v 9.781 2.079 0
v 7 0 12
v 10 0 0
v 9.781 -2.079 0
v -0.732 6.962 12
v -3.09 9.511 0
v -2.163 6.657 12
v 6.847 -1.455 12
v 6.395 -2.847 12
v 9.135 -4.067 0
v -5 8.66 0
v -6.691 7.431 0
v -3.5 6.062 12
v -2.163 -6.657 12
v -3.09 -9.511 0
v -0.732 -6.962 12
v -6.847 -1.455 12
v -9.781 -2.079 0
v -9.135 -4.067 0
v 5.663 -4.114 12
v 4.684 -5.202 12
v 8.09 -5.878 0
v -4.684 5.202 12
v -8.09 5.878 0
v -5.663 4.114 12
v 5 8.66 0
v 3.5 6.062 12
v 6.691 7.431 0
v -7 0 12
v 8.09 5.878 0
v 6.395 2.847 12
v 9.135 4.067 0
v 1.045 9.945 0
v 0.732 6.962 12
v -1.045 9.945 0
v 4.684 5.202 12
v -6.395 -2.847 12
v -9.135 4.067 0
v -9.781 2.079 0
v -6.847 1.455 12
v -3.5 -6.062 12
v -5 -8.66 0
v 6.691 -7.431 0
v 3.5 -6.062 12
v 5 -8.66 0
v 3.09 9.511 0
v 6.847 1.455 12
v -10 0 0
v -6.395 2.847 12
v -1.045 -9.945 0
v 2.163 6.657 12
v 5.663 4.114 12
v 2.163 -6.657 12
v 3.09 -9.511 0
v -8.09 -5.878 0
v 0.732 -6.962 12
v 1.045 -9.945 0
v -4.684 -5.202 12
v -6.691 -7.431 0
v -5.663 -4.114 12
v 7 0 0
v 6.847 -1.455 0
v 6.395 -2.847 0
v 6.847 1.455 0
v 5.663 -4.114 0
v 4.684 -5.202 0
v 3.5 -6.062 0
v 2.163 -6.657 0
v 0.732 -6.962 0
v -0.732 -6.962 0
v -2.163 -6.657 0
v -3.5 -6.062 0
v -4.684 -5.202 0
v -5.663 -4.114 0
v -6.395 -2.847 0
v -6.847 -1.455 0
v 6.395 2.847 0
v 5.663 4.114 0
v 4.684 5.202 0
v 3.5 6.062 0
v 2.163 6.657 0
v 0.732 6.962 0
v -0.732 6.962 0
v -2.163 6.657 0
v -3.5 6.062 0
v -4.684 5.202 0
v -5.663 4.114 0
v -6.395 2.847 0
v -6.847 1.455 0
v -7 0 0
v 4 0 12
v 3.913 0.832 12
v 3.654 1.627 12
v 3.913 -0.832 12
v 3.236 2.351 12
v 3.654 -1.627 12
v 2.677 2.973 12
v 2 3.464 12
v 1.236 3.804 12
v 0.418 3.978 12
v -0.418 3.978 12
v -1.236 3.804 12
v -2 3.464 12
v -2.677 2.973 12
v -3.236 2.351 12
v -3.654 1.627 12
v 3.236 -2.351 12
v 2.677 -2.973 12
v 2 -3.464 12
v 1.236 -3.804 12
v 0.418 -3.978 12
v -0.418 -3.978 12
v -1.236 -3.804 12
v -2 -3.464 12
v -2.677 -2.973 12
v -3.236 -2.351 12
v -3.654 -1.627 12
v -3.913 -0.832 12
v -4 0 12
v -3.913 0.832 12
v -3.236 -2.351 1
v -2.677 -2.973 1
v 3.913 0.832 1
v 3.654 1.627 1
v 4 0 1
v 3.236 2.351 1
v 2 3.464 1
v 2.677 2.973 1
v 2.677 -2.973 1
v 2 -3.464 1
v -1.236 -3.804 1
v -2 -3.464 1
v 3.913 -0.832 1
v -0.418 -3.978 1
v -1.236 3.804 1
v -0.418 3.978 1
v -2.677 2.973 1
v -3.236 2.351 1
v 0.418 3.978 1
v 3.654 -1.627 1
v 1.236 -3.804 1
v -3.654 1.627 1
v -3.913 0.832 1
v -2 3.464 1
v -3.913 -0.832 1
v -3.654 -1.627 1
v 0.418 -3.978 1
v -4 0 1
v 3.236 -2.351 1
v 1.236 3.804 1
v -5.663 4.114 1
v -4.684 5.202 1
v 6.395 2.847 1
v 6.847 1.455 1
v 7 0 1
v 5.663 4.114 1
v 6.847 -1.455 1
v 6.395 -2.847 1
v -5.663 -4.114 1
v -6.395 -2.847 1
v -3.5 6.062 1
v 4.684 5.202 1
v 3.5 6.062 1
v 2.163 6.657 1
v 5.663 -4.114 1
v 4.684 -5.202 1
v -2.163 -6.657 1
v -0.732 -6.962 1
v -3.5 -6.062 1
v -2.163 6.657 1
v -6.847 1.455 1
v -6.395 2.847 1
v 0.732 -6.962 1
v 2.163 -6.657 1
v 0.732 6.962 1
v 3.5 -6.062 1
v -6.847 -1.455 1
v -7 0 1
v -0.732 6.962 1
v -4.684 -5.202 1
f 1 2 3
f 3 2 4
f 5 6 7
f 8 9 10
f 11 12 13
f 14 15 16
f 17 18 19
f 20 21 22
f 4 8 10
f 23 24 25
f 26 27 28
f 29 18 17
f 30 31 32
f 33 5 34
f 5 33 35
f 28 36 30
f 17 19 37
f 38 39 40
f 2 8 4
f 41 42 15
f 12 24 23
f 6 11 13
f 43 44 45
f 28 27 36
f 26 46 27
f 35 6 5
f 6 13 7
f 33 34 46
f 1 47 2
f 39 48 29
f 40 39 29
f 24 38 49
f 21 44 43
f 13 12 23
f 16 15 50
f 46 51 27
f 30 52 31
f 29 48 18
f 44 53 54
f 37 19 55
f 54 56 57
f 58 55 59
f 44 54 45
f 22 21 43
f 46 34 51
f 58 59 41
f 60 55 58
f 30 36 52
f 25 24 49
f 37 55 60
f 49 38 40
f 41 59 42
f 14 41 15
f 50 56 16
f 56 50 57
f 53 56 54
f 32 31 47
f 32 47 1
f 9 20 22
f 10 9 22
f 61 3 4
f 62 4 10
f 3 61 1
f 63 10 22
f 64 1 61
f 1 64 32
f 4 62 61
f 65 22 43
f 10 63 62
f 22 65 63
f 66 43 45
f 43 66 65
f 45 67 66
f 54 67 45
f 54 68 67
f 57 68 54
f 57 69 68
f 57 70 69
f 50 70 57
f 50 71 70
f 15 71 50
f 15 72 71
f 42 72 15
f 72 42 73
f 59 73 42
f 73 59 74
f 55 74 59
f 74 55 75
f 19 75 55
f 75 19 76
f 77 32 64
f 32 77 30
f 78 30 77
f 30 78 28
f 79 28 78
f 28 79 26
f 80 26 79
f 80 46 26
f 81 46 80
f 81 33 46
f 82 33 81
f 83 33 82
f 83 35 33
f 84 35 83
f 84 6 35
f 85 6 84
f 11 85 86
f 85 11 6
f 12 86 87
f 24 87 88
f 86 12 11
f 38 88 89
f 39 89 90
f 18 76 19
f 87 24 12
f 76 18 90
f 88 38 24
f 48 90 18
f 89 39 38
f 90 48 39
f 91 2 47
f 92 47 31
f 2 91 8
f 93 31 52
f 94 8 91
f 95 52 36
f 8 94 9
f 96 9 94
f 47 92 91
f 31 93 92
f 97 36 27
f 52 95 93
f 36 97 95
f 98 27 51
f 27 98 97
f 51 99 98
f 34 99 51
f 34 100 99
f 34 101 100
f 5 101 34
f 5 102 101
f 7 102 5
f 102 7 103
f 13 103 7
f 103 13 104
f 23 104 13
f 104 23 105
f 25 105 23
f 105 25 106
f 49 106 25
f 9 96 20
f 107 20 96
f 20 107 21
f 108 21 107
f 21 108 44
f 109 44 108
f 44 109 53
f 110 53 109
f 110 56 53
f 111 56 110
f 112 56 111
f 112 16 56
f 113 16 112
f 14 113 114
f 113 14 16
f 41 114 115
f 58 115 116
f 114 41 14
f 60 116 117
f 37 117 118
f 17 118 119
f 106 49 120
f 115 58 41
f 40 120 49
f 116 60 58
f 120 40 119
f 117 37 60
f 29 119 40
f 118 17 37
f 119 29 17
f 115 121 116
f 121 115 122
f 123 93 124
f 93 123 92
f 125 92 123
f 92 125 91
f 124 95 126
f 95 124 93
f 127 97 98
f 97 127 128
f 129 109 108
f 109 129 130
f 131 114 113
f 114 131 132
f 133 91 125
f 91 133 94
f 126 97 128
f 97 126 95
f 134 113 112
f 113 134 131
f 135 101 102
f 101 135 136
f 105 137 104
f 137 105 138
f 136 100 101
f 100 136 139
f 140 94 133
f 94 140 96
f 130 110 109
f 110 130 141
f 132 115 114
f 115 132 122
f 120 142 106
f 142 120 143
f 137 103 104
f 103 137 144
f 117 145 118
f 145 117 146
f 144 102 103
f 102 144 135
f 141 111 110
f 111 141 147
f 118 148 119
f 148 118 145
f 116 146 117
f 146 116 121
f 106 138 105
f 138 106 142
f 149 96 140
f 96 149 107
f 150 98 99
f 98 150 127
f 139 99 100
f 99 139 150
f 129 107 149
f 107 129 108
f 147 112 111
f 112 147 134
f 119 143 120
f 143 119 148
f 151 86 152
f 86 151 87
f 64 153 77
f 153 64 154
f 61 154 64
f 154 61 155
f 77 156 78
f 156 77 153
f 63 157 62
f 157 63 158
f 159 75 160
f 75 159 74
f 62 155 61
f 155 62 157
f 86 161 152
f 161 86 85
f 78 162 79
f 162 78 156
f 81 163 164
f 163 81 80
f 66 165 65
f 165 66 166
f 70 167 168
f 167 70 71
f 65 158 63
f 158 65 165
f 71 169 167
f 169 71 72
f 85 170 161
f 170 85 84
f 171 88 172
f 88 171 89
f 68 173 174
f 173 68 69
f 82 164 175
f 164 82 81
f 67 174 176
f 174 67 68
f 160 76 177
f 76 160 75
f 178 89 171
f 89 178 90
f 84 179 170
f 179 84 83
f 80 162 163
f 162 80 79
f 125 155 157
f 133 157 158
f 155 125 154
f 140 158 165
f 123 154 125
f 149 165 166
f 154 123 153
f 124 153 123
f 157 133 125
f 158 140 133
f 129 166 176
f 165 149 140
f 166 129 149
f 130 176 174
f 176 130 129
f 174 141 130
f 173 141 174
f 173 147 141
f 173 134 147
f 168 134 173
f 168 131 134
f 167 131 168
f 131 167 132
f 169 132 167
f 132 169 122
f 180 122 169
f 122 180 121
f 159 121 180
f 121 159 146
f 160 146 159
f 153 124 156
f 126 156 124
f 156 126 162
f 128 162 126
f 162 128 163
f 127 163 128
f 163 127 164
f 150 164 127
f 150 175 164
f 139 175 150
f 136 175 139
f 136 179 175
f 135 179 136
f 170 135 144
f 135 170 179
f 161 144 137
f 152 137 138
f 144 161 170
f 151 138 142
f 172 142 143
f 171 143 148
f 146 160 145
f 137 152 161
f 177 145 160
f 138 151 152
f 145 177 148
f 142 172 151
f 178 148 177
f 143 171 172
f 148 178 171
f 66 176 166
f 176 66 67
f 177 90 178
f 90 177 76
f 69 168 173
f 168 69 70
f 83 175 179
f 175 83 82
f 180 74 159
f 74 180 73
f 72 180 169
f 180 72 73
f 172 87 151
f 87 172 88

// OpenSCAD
$fn = 30;
bolt_hole = 8;
length = 12;
top_width = 14;
bottom_width = 20;
bottom_gap_depth =1;

difference() {
    cylinder(d2 = top_width, d1 = bottom_width, h = length);
    translate([0,0,-0.01]) cylinder(d = bolt_hole, h = length + 0.02);
    #translate([0,0,-0.01]) cylinder(d = top_width, h = bottom_gap_depth + 0.01);
}
